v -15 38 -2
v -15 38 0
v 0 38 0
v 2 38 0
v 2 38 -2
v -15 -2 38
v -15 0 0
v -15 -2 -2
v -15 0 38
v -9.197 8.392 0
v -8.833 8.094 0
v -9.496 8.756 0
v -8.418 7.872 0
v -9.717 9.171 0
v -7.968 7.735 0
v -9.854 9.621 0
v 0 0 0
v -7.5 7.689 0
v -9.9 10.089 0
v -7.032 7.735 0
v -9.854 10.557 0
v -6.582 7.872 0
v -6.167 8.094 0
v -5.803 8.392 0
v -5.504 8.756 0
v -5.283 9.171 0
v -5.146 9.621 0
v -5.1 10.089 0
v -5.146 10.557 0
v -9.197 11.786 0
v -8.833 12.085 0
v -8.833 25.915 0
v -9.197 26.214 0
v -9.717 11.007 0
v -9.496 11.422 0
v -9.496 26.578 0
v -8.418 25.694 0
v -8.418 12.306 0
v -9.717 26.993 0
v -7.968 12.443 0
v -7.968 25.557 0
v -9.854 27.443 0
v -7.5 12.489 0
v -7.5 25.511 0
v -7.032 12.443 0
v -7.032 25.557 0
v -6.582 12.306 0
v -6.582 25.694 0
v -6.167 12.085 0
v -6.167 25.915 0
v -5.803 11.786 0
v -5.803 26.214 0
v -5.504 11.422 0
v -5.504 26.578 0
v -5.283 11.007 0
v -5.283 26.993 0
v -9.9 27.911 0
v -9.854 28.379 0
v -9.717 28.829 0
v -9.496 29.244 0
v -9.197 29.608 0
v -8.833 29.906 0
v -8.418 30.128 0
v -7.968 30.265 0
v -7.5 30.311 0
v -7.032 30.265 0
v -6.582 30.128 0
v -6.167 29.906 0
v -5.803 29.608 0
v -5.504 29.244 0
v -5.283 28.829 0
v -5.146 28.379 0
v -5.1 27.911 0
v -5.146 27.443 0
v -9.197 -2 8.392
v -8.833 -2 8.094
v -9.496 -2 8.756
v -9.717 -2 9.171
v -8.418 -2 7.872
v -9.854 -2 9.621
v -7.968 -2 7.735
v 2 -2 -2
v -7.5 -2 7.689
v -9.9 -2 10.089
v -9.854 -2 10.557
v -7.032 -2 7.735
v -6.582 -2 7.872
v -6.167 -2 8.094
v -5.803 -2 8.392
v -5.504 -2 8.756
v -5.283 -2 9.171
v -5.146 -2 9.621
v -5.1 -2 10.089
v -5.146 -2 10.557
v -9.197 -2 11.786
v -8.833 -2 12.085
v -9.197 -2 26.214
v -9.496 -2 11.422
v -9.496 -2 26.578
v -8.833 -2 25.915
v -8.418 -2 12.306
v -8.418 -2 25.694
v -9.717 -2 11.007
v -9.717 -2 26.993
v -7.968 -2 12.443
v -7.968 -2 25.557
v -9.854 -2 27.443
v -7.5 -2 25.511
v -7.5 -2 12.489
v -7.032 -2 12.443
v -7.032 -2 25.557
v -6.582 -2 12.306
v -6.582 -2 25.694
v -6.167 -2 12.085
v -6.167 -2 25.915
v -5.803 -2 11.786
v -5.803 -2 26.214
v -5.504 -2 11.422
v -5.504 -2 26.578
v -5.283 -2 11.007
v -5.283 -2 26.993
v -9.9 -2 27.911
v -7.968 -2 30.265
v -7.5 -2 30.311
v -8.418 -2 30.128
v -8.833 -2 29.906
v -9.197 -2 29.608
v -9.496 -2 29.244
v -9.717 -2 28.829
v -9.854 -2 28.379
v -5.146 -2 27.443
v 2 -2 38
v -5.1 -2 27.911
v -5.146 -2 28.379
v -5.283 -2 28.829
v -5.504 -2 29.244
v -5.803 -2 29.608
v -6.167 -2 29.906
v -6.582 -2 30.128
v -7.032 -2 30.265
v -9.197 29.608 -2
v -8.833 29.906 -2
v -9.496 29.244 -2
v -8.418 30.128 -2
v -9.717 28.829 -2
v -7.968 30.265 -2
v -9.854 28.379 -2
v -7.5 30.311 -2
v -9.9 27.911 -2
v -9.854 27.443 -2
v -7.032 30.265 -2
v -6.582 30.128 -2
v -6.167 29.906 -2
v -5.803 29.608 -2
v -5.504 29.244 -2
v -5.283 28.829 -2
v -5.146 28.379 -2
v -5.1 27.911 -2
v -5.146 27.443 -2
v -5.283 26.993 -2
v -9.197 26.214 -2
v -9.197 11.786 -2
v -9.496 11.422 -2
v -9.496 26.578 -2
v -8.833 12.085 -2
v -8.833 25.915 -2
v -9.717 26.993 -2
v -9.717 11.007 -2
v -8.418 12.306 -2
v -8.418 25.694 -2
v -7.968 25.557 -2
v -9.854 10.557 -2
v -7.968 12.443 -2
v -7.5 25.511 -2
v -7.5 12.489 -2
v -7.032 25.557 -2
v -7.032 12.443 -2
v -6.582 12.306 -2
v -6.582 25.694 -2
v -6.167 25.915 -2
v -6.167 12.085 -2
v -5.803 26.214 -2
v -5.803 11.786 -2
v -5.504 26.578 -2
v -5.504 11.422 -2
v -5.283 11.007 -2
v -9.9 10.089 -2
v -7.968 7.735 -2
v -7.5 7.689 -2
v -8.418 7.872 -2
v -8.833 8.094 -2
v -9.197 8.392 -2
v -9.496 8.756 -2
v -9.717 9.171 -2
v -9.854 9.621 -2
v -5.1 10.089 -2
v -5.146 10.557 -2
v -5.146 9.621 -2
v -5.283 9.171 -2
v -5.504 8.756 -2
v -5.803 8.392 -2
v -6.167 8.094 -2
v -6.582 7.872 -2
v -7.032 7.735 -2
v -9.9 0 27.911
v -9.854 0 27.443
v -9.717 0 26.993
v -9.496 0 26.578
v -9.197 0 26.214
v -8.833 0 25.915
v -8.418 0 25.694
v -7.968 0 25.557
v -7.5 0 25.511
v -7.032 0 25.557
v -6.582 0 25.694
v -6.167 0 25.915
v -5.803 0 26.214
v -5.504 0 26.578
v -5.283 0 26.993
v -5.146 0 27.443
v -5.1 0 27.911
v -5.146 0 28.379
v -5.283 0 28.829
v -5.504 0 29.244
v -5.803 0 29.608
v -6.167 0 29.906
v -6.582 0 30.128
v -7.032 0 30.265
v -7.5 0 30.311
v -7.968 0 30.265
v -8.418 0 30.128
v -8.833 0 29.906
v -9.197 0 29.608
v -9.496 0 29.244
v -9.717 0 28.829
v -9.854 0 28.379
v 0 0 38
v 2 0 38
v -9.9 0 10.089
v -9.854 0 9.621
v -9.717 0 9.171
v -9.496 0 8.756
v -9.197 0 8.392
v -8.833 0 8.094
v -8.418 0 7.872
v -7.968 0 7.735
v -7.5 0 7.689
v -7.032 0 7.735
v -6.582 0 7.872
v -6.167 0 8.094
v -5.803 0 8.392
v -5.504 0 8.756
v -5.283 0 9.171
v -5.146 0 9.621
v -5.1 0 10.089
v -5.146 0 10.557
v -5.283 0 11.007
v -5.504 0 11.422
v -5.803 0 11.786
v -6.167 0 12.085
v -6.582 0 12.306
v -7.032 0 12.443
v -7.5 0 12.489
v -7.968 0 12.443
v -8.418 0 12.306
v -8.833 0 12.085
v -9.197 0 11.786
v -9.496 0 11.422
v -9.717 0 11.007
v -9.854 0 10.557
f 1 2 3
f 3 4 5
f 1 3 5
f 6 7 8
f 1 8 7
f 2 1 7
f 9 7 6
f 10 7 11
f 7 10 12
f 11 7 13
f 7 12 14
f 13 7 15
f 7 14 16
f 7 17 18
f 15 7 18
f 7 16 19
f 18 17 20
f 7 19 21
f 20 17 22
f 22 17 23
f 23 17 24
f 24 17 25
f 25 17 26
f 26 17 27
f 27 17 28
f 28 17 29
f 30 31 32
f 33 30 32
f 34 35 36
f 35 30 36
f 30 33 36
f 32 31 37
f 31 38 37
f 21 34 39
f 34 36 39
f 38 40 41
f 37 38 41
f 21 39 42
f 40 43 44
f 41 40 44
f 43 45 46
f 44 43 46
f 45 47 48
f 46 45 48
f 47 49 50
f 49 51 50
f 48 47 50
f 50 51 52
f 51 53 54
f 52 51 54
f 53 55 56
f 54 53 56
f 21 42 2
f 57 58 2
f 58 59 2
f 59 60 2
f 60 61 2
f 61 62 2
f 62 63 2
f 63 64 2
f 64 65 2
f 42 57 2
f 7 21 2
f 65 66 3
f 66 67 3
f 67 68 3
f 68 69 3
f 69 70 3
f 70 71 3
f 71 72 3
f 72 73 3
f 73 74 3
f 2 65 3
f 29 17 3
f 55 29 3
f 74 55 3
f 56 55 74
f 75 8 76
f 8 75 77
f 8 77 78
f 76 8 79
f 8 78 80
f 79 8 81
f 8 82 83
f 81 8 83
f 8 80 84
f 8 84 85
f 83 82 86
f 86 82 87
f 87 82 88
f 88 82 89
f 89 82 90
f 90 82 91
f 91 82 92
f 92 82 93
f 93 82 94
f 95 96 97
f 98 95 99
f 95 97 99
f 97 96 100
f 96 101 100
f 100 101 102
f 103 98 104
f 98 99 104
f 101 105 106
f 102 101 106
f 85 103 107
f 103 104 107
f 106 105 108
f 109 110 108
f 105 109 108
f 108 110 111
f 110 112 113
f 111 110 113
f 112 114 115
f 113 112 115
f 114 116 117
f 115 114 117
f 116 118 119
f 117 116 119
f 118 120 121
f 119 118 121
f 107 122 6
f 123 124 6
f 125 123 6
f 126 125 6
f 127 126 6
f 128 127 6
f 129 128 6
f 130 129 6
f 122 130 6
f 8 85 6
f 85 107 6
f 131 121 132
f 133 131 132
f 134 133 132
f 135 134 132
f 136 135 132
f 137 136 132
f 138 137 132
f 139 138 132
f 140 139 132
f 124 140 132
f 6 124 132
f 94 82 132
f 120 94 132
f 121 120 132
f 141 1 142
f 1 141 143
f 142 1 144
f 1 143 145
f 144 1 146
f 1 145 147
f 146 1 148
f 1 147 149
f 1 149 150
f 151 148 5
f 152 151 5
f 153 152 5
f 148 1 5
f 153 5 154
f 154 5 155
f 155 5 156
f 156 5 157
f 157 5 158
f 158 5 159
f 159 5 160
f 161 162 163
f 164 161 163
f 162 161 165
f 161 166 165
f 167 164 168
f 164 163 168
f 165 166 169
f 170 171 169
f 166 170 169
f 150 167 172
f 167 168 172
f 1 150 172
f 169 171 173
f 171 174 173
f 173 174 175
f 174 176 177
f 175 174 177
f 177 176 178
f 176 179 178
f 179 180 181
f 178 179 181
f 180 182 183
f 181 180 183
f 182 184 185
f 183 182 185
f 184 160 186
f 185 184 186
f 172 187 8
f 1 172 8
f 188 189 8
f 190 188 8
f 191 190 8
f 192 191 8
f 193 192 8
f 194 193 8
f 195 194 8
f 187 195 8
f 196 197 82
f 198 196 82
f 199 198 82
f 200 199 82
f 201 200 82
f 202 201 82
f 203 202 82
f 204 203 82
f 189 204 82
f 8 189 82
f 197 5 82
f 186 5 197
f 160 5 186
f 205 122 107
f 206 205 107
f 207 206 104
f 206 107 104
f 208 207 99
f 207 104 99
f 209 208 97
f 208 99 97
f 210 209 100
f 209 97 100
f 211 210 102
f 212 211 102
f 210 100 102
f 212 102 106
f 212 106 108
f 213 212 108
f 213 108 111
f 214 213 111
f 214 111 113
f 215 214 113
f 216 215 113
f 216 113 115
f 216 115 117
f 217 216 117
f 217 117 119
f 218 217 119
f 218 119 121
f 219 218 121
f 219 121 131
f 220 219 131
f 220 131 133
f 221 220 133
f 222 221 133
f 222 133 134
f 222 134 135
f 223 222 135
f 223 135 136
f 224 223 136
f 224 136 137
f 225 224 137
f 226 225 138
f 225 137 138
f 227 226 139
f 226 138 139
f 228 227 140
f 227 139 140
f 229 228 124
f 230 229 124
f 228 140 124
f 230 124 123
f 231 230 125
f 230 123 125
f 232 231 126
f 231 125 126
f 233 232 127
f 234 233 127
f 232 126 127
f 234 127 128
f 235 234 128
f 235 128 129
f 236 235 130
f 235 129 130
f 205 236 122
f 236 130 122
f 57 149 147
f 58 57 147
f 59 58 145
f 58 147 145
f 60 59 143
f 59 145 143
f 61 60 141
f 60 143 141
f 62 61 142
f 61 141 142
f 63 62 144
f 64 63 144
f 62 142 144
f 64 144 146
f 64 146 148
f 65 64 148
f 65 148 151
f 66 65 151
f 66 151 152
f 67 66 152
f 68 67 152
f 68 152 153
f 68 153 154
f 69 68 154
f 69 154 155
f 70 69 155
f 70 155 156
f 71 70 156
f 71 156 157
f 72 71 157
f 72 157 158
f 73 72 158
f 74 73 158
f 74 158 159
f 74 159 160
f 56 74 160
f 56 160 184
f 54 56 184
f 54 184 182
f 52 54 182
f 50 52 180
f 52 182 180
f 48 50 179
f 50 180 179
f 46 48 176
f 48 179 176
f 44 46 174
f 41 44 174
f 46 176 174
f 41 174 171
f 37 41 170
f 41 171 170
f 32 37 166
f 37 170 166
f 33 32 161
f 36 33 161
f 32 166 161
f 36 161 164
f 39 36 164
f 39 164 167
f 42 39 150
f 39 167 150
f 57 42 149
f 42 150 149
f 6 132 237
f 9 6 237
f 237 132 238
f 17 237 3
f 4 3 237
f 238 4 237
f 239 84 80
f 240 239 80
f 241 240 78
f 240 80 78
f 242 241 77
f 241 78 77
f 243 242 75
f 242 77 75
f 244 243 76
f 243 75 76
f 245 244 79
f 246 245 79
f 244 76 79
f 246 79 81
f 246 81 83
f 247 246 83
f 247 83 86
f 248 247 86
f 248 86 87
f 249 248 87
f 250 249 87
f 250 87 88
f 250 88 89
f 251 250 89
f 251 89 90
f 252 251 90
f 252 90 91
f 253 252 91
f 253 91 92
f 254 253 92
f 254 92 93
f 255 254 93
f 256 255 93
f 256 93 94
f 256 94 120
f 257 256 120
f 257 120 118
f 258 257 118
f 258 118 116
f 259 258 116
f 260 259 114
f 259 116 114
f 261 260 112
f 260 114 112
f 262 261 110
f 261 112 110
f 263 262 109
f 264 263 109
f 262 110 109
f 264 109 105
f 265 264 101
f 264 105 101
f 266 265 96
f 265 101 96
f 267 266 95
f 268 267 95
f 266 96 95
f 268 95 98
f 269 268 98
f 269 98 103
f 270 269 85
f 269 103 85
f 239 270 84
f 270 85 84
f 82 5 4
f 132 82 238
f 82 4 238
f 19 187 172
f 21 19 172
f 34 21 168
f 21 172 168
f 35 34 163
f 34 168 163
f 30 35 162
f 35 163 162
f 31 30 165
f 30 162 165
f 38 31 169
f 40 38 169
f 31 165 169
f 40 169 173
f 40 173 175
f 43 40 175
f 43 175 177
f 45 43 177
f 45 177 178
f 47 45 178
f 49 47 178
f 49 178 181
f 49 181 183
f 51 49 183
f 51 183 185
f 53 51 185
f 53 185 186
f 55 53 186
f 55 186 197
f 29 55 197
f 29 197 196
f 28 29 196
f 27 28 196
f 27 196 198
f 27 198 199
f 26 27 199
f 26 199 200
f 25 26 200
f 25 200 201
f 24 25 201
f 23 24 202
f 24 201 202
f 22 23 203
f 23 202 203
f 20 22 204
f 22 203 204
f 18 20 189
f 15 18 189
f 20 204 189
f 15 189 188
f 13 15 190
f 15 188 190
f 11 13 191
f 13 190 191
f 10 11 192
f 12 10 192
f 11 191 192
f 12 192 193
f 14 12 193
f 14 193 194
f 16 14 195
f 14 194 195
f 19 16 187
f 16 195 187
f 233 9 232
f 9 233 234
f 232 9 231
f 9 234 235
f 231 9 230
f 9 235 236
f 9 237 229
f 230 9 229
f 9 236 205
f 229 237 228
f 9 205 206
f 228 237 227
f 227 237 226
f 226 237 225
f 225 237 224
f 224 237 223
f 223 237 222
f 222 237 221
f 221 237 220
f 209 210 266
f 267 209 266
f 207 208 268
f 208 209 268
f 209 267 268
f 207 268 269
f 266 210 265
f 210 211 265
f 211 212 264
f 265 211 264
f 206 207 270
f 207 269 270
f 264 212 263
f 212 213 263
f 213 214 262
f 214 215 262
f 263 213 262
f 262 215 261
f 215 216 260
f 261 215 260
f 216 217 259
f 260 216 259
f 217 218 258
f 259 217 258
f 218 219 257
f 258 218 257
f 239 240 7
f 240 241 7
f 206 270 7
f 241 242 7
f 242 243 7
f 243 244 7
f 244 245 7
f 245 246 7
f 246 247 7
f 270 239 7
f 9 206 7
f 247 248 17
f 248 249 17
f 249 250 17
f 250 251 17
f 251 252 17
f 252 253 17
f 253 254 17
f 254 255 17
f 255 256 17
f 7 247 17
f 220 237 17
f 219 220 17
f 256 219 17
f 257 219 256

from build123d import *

# Parameters (mm, degrees)
BOSS_EXTRUDE1_DEPTH      = 2
BOSS_EXTRUDE2_DEPTH      = 17
SKETCH3_R                = 2.1
M4_CLEARANCE_HOLE1_D     = 4.8
M4_CLEARANCE_HOLE1_DEPTH = 2
M4_CLEARANCE_HOLE2_D     = 4.8
M4_CLEARANCE_HOLE2_DEPTH = 2


with BuildPart() as part:
    # Sketch1 → Boss-Extrude1 (new body)
    with BuildSketch(Plane(origin=(0, 0, 0), x_dir=(0, 0, -1), z_dir=(1, 0, 0))):
        Polygon((-38, 0), (0, 0), (0, 38), align=None)
    extrude(amount=BOSS_EXTRUDE1_DEPTH)

    # Sketch2 → Boss-Extrude2 (add)
    with BuildSketch(Plane(origin=(2, 0, 0), x_dir=(0, 0, -1), z_dir=(1, 0, 0))):
        Polygon((0, 38), (2, 38), (2, -2), (-38, -2), (-38, 0), (0, 0), align=None)
    extrude(amount=-BOSS_EXTRUDE2_DEPTH)

    # Sketch3 → Cut-Revolve1 (revolve, cut)
    with BuildSketch(Plane(origin=(0, 0, 0), x_dir=(1, 0, 0), z_dir=(0, 1, 0))):
        with Locations((-7.5, -10.089030863)):
            Circle(SKETCH3_R)
        with Locations((-7.5, -27.910969137)):
            Circle(SKETCH3_R)
    revolve(axis=Axis((-15, 0, 0), (1, 0, 0)), mode=Mode.SUBTRACT)

    # M4 Clearance Hole1
    with Locations(Plane.XY):
        with Locations((-7.5, 27.910969137), (-7.5, 10.089030863)):
            Hole(M4_CLEARANCE_HOLE1_D / 2, depth=M4_CLEARANCE_HOLE1_DEPTH)

    # M4 Clearance Hole2
    with Locations(Plane(origin=(0, 0, 0), x_dir=(1, 0, 0), z_dir=(0, 1, 0))):
        with Locations((-7.5, -10.089030863), (-7.5, -27.910969137)):
            Hole(M4_CLEARANCE_HOLE2_D / 2, depth=M4_CLEARANCE_HOLE2_DEPTH)


solid = part.part
